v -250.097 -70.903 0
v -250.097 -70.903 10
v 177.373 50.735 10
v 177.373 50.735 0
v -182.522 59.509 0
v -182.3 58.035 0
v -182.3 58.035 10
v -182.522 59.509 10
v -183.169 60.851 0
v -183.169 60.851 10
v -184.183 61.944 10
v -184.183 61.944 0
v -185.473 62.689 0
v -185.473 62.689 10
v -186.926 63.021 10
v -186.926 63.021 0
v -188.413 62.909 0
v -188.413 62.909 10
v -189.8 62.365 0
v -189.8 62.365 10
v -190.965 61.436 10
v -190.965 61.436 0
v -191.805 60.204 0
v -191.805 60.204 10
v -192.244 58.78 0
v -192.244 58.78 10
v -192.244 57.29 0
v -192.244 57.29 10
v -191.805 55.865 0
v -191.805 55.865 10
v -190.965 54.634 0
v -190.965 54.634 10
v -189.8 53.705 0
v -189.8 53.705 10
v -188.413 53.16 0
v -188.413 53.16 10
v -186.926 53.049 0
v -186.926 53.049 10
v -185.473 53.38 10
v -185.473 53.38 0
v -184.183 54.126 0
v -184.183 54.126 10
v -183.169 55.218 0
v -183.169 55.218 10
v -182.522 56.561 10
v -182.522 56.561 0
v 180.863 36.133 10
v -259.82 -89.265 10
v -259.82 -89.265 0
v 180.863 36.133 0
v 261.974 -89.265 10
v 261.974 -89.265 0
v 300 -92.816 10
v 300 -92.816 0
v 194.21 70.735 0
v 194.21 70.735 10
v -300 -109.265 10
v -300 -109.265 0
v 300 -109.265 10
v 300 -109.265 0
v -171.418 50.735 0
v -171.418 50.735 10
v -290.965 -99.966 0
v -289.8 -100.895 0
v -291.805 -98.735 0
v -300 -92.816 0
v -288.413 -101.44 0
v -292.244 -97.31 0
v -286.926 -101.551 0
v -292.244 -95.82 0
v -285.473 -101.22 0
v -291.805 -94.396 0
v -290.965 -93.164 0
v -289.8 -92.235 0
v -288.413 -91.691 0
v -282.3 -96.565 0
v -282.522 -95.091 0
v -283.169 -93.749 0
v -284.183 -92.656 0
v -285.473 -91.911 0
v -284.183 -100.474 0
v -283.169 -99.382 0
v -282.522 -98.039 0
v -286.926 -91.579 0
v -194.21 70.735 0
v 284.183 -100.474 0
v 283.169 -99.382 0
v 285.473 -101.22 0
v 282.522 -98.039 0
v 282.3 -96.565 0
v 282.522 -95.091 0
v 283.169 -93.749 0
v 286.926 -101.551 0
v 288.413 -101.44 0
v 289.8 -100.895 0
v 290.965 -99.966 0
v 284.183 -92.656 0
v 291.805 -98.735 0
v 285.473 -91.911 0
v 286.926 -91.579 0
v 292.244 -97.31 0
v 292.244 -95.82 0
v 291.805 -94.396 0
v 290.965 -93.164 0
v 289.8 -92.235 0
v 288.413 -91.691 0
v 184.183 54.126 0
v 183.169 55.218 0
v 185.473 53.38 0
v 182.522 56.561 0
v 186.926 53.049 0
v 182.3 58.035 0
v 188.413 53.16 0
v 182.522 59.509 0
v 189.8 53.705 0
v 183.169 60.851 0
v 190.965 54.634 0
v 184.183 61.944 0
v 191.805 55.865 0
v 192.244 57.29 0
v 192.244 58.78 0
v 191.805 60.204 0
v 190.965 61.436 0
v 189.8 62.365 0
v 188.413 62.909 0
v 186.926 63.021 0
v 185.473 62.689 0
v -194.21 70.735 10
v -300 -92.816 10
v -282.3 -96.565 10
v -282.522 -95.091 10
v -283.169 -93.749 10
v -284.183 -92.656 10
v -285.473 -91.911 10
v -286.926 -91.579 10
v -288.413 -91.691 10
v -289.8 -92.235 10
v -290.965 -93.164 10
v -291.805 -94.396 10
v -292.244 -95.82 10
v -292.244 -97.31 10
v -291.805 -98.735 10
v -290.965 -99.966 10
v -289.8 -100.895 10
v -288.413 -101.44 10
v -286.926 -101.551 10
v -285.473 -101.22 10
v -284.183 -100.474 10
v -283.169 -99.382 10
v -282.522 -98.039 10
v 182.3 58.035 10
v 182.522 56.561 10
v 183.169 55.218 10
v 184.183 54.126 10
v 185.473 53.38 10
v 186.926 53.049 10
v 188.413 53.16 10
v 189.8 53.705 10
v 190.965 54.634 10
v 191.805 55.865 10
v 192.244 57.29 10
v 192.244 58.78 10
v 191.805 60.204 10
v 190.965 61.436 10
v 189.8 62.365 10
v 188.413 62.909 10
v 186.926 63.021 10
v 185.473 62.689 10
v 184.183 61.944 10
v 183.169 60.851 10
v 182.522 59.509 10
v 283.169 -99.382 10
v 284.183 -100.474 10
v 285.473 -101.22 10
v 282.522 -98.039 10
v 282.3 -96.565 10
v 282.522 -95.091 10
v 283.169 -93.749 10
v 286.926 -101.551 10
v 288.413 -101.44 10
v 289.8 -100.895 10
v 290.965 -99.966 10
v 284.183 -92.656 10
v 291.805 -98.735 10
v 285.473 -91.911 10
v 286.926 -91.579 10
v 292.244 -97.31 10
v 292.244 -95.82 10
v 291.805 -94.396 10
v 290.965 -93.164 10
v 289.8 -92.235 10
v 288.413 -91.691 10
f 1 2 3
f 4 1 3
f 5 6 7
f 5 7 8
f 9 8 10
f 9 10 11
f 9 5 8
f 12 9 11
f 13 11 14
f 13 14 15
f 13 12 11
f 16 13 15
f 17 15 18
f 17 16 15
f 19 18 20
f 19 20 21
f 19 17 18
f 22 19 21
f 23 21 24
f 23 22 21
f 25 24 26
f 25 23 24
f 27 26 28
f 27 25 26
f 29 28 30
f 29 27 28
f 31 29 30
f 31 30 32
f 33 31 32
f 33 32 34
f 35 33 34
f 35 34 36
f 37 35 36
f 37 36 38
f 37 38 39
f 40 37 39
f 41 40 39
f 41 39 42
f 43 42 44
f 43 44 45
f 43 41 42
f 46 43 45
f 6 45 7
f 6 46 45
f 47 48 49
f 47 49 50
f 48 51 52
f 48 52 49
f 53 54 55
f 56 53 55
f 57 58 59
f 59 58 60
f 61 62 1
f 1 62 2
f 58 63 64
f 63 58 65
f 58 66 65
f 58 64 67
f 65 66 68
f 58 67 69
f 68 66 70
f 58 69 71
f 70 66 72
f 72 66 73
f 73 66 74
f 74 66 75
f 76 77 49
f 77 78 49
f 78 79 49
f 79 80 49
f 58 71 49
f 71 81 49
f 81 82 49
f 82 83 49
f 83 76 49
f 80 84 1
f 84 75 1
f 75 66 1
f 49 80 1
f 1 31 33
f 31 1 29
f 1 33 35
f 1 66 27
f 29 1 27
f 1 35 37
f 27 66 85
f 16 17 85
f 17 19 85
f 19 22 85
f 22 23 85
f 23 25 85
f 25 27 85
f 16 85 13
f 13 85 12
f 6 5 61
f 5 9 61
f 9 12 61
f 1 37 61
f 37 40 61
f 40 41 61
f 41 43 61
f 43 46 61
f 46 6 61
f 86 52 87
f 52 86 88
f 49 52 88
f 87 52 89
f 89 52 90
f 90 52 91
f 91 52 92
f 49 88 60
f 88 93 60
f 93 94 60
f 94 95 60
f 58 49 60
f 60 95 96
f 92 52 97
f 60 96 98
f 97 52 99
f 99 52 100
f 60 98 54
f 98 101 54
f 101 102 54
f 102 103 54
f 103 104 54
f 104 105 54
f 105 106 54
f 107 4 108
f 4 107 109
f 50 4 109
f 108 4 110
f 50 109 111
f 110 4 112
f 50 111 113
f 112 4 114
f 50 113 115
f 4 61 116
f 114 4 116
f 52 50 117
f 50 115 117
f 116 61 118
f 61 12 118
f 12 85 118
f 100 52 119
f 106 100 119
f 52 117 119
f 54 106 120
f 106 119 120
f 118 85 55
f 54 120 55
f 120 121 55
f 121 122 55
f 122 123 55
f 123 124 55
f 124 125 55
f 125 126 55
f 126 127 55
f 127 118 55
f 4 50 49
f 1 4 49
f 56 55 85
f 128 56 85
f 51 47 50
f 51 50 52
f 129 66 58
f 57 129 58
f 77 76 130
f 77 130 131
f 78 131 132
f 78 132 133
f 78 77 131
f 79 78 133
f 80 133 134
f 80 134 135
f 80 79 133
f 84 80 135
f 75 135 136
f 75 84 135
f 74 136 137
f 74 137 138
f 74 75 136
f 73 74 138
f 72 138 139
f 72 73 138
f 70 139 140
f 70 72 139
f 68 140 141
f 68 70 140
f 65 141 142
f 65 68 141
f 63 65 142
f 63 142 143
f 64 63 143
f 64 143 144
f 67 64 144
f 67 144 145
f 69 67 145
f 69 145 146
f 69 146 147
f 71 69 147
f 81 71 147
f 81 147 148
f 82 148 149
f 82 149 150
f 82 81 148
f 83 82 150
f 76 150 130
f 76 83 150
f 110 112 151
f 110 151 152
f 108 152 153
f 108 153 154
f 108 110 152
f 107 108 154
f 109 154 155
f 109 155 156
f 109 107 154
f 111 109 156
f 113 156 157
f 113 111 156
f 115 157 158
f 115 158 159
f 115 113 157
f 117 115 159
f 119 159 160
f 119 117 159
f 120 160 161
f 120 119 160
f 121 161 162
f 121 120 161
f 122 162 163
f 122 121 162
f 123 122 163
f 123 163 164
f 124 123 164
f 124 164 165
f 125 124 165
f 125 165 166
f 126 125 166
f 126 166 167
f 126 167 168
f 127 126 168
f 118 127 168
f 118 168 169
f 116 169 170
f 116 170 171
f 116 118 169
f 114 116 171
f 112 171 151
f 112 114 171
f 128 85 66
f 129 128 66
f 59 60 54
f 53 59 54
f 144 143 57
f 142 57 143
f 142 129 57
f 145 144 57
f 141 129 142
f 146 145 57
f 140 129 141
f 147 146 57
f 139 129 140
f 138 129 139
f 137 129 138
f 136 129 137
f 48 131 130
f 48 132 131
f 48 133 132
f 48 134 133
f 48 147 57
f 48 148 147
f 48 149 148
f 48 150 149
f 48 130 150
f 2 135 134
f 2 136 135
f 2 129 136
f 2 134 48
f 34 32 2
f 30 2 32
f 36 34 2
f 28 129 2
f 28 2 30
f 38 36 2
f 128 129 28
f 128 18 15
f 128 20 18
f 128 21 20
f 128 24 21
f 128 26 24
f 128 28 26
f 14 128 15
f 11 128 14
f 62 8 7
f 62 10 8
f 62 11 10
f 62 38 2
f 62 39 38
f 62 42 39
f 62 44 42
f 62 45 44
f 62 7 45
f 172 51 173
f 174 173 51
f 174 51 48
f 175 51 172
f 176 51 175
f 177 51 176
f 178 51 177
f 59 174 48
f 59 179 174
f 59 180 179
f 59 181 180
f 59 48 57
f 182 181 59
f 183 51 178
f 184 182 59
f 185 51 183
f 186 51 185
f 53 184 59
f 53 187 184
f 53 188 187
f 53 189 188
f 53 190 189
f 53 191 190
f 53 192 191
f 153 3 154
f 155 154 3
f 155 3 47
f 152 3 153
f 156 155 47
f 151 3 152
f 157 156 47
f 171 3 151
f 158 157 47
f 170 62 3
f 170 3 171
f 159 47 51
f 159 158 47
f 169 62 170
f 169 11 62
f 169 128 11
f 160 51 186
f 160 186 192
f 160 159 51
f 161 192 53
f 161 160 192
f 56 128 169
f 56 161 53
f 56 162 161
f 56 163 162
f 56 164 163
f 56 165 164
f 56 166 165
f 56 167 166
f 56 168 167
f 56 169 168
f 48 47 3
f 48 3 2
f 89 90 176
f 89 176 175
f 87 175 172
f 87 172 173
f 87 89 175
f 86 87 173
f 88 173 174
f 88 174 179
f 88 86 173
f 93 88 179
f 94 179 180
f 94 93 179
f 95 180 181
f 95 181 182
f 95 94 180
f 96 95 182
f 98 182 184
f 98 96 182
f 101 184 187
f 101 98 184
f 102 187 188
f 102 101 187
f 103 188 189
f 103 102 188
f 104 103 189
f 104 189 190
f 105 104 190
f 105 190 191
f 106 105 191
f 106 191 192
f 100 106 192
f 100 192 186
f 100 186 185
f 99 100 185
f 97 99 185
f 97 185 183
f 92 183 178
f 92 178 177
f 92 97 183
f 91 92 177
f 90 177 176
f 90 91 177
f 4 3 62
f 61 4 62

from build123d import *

# Parameters (mm, degrees)
SKETCH1_R           = 5
BOSS_EXTRUDE1_DEPTH = 10
CUT_EXTRUDE1_DEPTH  = 320.43525409


with BuildPart() as part:
    # Sketch1 → Boss-Extrude1 (new body)
    with BuildSketch(Plane.XY):
        Polygon((300, -109.265189129), (300, -92.815809214), (194.210465663, 70.734810871), (-194.210465663, 70.734810871), (-300, -92.815809214), (-300, -109.265189129), align=None)
        with Locations((-187.3, 58.034810871)):
            Circle(SKETCH1_R, mode=Mode.SUBTRACT)
        with Locations((-287.3, -96.565189129)):
            Circle(SKETCH1_R, mode=Mode.SUBTRACT)
        with Locations(Location((287.3, -96.565189129, 0), (0, 0, 180))):
            Circle(SKETCH1_R, mode=Mode.SUBTRACT)
        with Locations(Location((187.3, 58.034810871, 0), (0, 0, 180))):
            Circle(SKETCH1_R, mode=Mode.SUBTRACT)
    extrude(amount=BOSS_EXTRUDE1_DEPTH)

    # Sketch2 → Cut-Extrude1 (cut, through all)
    with BuildSketch(Plane.XY.offset(10)):
        Polygon((180.863413893, 36.132549959), (261.974499978, -89.265189129), (-259.820043515, -89.265189129), align=None)
        Polygon((-250.097346147, -70.903109306), (177.373034147, 50.734810871), (-171.418225722, 50.734810871), align=None)
    extrude(amount=-CUT_EXTRUDE1_DEPTH, mode=Mode.SUBTRACT)


solid = part.part
